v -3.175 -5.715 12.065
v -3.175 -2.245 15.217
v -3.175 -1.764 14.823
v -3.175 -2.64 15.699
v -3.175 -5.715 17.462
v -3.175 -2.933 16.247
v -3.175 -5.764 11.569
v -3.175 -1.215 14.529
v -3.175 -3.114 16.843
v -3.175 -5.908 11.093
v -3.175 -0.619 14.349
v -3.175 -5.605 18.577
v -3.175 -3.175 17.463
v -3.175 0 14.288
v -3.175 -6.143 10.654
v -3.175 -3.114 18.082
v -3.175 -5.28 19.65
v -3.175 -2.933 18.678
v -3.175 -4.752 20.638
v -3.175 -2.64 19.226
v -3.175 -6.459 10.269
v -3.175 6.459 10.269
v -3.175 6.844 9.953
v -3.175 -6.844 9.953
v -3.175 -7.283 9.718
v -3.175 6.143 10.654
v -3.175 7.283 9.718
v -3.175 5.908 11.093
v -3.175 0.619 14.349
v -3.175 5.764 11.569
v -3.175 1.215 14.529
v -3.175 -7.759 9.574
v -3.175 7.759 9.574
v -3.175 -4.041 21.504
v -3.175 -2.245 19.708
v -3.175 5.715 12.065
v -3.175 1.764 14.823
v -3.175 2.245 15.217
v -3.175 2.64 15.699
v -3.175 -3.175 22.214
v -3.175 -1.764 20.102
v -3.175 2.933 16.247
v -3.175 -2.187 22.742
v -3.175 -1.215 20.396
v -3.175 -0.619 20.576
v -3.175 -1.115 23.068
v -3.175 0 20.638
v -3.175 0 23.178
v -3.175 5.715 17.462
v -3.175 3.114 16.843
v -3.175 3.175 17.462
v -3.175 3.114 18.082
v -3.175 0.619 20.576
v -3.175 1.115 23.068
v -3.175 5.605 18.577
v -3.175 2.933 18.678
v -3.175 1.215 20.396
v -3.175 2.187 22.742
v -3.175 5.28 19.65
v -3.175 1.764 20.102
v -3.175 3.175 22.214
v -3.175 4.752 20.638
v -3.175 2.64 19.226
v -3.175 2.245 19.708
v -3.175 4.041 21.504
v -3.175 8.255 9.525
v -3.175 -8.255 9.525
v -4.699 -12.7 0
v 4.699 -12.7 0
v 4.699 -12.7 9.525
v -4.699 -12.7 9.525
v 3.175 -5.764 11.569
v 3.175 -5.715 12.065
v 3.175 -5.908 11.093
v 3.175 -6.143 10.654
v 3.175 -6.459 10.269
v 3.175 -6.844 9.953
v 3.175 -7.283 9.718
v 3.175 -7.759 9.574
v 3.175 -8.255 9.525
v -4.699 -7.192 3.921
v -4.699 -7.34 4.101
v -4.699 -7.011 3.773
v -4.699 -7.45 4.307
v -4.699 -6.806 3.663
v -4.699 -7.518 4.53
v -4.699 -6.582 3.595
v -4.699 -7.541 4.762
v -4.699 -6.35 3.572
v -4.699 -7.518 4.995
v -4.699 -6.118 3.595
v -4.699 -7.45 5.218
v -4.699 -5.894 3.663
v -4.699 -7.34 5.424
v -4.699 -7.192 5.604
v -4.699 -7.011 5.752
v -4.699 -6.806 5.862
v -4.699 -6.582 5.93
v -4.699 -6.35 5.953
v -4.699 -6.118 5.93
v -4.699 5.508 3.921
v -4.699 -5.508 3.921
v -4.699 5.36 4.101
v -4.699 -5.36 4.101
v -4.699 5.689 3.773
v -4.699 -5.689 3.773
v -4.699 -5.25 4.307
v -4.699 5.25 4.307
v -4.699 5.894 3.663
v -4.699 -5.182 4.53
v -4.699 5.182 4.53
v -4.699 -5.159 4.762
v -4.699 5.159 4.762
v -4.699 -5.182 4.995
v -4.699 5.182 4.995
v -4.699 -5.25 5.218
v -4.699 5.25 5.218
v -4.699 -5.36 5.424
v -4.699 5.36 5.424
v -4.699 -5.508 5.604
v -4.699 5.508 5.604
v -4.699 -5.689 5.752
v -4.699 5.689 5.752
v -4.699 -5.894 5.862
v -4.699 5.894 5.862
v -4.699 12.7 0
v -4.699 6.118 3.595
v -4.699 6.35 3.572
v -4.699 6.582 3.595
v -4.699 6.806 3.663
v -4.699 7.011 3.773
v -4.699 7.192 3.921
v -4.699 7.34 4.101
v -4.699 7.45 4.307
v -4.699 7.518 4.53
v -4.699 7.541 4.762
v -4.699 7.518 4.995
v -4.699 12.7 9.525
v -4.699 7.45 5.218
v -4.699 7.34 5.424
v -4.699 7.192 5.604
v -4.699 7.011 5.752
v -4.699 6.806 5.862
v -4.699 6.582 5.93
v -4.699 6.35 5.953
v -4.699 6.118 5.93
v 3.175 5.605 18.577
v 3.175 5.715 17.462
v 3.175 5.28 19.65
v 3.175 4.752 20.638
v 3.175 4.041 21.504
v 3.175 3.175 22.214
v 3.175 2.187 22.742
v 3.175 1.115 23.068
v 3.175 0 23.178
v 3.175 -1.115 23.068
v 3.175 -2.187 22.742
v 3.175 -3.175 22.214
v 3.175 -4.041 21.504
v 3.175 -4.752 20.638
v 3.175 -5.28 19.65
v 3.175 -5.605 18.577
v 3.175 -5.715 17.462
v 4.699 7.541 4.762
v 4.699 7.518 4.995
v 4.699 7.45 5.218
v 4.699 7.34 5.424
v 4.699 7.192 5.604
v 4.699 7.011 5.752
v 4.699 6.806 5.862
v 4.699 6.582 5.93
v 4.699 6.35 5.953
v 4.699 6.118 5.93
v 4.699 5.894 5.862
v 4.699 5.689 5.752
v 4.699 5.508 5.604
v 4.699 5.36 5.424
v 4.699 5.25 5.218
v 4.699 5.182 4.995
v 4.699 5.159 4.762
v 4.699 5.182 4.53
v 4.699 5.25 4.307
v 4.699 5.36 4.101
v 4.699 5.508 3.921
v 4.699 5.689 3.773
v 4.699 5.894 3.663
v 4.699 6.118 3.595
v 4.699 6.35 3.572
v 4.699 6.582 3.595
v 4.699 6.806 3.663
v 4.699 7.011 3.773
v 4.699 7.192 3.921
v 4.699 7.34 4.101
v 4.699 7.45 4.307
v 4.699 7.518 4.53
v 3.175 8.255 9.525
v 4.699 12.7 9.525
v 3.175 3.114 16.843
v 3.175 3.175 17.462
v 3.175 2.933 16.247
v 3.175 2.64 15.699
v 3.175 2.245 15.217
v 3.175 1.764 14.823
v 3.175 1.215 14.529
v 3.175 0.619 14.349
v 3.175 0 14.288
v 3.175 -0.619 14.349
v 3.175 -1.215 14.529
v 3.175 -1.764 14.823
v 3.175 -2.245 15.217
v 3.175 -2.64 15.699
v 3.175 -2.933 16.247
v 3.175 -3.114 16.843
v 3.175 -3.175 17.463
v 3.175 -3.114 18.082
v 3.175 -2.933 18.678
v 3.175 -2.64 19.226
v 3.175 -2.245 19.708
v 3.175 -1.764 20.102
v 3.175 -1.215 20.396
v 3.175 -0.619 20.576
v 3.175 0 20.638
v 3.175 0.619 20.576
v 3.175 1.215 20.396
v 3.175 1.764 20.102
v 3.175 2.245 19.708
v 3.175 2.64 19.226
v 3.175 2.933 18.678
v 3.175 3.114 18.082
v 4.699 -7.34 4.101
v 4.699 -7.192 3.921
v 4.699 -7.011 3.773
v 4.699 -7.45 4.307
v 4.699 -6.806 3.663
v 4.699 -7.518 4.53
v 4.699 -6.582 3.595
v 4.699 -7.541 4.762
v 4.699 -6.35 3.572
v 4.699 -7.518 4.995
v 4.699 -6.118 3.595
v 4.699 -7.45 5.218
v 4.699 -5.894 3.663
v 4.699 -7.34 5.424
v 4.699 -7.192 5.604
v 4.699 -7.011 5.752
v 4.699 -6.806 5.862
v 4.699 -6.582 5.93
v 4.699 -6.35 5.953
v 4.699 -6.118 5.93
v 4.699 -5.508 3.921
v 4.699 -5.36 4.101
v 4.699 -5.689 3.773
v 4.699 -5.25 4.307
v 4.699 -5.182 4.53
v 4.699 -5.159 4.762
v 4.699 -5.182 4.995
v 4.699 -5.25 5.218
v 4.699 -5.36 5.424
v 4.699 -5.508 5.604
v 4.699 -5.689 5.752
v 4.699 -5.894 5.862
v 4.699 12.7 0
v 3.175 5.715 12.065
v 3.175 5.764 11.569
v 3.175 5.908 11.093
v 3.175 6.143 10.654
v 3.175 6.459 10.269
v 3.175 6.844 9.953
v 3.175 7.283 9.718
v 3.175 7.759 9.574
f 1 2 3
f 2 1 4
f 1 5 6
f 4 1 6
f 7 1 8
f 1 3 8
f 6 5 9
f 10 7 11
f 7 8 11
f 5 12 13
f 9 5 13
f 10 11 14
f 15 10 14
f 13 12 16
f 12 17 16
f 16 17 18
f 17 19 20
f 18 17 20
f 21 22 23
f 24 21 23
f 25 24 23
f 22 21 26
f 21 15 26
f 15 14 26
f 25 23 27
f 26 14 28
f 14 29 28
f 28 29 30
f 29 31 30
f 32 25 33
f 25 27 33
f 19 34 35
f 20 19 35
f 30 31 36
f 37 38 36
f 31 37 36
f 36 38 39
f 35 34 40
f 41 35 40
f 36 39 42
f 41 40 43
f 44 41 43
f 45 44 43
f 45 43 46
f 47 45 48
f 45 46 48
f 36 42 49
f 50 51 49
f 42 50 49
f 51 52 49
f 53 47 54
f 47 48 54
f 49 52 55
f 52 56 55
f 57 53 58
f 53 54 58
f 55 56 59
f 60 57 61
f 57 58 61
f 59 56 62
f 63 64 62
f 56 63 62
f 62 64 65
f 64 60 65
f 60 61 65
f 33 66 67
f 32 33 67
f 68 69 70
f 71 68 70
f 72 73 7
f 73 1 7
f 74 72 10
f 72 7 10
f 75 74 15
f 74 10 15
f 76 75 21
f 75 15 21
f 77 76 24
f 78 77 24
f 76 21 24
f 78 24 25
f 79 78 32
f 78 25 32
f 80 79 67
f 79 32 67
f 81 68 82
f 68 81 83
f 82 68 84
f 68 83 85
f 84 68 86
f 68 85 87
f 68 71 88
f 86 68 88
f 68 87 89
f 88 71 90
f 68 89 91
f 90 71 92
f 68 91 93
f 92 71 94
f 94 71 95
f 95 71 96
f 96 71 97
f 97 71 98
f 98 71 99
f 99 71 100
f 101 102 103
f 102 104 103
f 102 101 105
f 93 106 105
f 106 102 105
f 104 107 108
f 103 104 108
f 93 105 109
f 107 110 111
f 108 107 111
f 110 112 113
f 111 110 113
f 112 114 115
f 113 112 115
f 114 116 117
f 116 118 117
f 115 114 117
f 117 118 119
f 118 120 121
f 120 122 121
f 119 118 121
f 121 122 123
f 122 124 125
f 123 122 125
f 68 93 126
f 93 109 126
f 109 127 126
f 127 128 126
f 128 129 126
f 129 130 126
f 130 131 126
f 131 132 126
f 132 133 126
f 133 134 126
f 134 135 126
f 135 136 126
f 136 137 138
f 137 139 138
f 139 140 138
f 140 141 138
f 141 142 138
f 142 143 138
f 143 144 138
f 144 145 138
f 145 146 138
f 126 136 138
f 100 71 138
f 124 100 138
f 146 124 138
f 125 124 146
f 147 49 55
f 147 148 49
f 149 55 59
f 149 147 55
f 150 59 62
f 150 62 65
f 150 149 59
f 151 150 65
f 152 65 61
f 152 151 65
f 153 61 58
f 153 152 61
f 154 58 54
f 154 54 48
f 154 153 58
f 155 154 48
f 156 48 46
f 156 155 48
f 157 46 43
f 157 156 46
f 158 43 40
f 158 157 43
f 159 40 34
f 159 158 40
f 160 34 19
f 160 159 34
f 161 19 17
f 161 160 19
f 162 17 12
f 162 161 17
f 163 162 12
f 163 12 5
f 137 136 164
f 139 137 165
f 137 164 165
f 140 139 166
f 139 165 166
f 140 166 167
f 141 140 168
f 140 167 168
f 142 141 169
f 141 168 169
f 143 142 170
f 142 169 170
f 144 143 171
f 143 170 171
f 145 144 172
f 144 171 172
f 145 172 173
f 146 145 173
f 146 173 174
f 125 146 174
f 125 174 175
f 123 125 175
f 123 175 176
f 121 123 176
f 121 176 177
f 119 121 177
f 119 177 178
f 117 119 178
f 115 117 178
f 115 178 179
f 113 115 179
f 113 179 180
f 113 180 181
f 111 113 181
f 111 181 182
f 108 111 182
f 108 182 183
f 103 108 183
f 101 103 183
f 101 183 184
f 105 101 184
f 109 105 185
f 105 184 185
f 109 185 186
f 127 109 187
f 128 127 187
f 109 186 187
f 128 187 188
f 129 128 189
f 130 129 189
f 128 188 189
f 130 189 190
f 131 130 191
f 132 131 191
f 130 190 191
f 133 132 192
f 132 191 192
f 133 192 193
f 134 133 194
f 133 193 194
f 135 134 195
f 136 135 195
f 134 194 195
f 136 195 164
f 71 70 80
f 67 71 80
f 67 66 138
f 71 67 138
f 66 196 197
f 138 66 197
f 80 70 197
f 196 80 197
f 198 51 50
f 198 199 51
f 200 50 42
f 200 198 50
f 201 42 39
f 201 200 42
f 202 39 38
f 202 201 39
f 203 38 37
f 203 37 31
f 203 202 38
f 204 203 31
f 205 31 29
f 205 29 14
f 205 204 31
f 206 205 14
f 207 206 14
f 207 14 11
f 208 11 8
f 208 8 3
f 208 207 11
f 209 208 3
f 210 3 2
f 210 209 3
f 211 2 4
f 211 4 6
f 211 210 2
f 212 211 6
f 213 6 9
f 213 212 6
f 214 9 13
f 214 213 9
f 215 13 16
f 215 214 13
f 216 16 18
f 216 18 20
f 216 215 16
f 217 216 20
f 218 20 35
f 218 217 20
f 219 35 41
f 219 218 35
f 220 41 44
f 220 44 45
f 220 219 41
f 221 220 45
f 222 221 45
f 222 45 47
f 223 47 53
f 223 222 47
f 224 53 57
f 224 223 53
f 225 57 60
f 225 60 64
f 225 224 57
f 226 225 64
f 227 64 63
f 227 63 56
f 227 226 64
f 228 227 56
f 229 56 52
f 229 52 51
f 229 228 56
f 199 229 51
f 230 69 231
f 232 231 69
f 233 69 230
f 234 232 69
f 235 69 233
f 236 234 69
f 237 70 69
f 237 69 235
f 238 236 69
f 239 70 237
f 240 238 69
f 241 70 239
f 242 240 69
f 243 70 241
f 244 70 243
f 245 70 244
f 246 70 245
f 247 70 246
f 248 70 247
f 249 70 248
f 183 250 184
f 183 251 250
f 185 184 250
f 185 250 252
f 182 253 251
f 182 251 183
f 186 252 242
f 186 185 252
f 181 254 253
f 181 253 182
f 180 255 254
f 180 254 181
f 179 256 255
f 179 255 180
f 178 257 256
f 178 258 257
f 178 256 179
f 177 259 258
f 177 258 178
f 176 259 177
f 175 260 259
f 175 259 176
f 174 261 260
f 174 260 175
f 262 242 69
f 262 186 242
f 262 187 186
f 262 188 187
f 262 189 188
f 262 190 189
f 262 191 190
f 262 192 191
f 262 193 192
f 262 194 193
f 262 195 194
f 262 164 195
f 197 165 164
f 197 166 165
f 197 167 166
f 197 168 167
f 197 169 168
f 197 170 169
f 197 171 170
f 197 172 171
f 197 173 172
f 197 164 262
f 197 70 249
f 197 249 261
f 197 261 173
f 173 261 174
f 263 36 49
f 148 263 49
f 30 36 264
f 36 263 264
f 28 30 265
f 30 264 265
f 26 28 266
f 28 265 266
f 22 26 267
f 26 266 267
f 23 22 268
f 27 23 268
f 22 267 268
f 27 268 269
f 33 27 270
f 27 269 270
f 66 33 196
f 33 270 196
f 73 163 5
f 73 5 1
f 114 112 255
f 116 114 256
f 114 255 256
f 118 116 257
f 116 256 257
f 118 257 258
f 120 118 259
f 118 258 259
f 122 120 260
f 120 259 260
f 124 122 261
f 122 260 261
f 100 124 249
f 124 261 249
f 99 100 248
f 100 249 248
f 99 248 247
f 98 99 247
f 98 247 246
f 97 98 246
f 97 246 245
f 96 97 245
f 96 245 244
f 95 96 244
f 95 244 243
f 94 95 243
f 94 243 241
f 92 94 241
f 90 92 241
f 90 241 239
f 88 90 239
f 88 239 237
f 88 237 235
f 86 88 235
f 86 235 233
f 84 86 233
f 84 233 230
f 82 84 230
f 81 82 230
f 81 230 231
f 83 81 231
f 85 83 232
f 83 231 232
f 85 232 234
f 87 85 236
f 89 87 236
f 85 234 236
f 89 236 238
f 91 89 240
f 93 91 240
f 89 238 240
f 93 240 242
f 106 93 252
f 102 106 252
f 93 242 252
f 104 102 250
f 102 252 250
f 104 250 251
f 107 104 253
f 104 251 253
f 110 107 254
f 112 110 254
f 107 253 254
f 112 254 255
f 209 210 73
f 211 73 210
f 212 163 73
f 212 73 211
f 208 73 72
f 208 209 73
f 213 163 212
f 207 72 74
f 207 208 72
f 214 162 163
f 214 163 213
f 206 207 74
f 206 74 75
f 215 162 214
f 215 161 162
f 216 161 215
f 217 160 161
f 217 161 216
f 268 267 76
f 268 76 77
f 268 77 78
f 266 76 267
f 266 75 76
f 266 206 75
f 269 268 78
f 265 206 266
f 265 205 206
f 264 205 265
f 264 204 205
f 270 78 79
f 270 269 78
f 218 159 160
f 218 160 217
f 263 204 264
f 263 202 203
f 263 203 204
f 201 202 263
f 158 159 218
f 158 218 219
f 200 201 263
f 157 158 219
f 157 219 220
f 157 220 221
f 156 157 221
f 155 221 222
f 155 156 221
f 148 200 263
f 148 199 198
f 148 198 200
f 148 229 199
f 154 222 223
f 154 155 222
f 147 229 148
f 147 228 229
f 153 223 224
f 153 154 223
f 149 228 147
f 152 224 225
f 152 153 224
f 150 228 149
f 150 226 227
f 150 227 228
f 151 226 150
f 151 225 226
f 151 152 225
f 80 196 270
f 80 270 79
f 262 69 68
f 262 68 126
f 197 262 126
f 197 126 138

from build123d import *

# Parameters (mm, degrees)
F0_W     = 25.4
F0_H     = 9.525
F1_DEPTH = 4.699
F3_DEPTH = 3.175
F4_R     = 1.190625
F5_DEPTH = 9.399
F6_R     = 2.54


with BuildPart() as f1:
    # F0 (on Right) → F1 (new body, symmetric)
    with BuildSketch(Plane.YZ):
        with Locations((0, 4.7625)):
            Rectangle(F0_W, F0_H)
    extrude(amount=F1_DEPTH, both=True)

    # F2 (on Right) → F3 (join, symmetric)
    with BuildSketch(Plane.YZ):
        with BuildLine():
            Line((3.175, 17.4625), (5.715, 17.4625))
            ThreePointArc((5.715, 17.4625), (0, 23.1775), (-5.715, 17.4625))
            Line((-5.715, 17.4625), (-3.175, 17.4625))
            ThreePointArc((-3.175, 17.4625), (0, 20.6375), (3.175, 17.4625))
        make_face()
        with BuildLine():
            Line((5.715, 0), (5.715, 17.4625))
            ThreePointArc((5.715, 17.4625), (0, 11.7475), (-5.715, 17.4625))
            Line((-5.715, 17.4625), (-5.715, 0))
            Line((-5.715, 0), (5.715, 0))
        make_face()
        with BuildLine():
            ThreePointArc((-5.715, 17.4625), (0, 11.7475), (5.715, 17.4625))
            Line((5.715, 17.4625), (3.175, 17.4625))
            ThreePointArc((3.175, 17.4625), (0, 14.2875), (-3.175, 17.4625))
            Line((-3.175, 17.4625), (-5.715, 17.4625))
        make_face()
    extrude(amount=F3_DEPTH, both=True)

    # F4 (on face) → F5 (cut, through all)
    with BuildSketch(Plane.YZ.offset(4.699)):
        with Locations((-6.35, 4.7625)):
            Circle(F4_R)
        with Locations((6.35, 4.7625)):
            Circle(F4_R)
    extrude(amount=-F5_DEPTH, mode=Mode.SUBTRACT)

    # F6
    f6_edges = [f1.edges().sort_by_distance(p)[0] for p in [
        (0, 5.715, 9.525),
        (0, -5.715, 9.525),
    ]]
    fillet(f6_edges, radius=F6_R)


solid = f1.part
